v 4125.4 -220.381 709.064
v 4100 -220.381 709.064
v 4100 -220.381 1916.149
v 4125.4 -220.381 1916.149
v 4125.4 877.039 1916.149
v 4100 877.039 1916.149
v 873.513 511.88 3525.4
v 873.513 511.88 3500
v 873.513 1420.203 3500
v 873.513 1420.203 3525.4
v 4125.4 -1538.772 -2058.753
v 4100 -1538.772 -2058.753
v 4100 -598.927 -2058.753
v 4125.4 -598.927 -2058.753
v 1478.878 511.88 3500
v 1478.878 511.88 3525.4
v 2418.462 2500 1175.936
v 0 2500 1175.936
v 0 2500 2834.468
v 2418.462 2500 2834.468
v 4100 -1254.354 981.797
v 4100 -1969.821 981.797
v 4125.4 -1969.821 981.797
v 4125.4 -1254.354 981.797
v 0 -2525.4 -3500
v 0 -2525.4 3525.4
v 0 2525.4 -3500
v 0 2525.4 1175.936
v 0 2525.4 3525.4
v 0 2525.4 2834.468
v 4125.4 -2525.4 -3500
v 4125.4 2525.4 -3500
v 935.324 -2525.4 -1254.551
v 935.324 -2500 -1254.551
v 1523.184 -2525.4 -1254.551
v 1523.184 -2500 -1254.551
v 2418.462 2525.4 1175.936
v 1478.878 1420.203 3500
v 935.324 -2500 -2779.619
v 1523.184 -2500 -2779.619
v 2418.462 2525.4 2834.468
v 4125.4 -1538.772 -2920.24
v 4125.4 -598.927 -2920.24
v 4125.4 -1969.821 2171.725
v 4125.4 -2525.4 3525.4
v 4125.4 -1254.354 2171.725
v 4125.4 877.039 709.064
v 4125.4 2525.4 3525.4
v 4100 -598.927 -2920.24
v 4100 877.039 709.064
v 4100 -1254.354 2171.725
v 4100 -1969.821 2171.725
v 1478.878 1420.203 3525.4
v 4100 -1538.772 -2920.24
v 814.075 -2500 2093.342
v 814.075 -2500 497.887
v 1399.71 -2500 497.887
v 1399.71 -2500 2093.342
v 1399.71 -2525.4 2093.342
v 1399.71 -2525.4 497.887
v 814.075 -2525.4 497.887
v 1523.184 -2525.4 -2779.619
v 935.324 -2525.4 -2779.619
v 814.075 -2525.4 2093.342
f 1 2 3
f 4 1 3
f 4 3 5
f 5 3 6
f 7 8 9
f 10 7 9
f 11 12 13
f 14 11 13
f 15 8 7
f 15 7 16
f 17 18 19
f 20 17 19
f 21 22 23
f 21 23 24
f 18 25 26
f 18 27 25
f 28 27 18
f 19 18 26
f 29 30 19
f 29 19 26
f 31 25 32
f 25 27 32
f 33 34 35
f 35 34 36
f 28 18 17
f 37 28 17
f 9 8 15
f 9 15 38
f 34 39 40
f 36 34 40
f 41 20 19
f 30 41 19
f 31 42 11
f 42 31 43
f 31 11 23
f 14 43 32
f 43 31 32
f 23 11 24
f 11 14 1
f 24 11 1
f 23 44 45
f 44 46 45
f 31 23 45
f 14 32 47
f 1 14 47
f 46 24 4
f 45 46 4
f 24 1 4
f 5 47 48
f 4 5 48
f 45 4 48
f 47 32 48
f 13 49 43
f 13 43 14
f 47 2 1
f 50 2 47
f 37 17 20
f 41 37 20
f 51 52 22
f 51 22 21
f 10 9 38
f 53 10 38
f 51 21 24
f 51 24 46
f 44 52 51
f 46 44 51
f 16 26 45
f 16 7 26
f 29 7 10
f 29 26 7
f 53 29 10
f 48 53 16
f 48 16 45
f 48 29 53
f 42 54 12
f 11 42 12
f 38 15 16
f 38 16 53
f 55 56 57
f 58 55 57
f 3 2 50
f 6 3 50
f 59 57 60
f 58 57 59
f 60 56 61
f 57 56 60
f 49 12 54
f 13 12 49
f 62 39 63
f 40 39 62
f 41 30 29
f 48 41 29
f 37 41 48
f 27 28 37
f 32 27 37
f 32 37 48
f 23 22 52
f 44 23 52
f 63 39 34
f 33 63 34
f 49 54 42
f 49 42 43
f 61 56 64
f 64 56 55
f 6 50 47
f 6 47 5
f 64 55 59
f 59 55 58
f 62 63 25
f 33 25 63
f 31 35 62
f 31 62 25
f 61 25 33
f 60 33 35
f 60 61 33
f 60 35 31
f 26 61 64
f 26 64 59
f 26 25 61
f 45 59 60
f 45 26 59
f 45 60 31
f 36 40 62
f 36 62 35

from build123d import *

# Parameters (mm, degrees)
F0_W     = 5000
F0_H     = 7000
F1_DEPTH = 4100
F2_W     = 5000
F2_H     = 7000
F2_W_2   = 939.845443
F2_H_2   = 861.487865
F2_W_3   = 715.46793
F2_H_3   = 1189.927101
F2_W_4   = 1097.420633
F2_H_4   = 1207.084894
F3_DEPTH = 25.4
F5_DEPTH = 25.4
F6_W     = 4125.4
F6_H     = 5025.4
F6_W_2   = 605.365574
F6_H_2   = 908.323109
F7_DEPTH = 25.4
F8_W     = 4125.4
F8_H     = 7025.4
F8_W_2   = 587.859869
F8_H_2   = 1525.068283
F8_W_3   = 585.635364
F8_H_3   = 1595.454812
F9_DEPTH = 25.4


with BuildPart() as f1:
    # F0 (on Right) → F1 (new body)
    with BuildSketch(Plane.YZ):
        Rectangle(F0_W, F0_H)
    extrude(amount=F1_DEPTH)

    # F2 (on face) → F3 (join)
    with BuildSketch(Plane.YZ.offset(4100)):
        Rectangle(F2_W, F2_H)
        with Locations((-1068.849325, -2489.496469)):
            Rectangle(F2_W_2, F2_H_2, mode=Mode.SUBTRACT)
        with Locations((-1612.087488, 1576.761008)):
            Rectangle(F2_W_3, F2_H_3, mode=Mode.SUBTRACT)
        with Locations((328.328997, 1312.606573)):
            Rectangle(F2_W_4, F2_H_4, mode=Mode.SUBTRACT)
    extrude(amount=F3_DEPTH)

    # F4 (on face) → F5 (join)
    with BuildSketch(Plane(origin=(0, 2500, 0), x_dir=(-1, 0, 0), z_dir=(0, 1, 0))):
        Polygon((0, -3500), (0, 1175.935984), (-2418.462276, 1175.935984), (-2418.462276, 2834.468126), (0, 2834.468126), (0, 3500), (-4125.4, 3500), (-4125.4, -3500), align=None)
    extrude(amount=F5_DEPTH)

    # F6 (on face) → F7 (join)
    with BuildSketch(Plane.XY.offset(3500)):
        with Locations((2062.7, 12.7)):
            Rectangle(F6_W, F6_H)
        with Locations((1176.195592, 966.041773)):
            Rectangle(F6_W_2, F6_H_2, mode=Mode.SUBTRACT)
    extrude(amount=F7_DEPTH)

    # F8 (on face) → F9 (join)
    with BuildSketch(Plane.XZ.offset(2500)):
        with Locations((2062.7, 12.7)):
            Rectangle(F8_W, F8_H)
        with Locations((1229.253768, -2017.085313)):
            Rectangle(F8_W_2, F8_H_2, mode=Mode.SUBTRACT)
        with Locations((1106.892616, 1295.614898)):
            Rectangle(F8_W_3, F8_H_3, mode=Mode.SUBTRACT)
    extrude(amount=F9_DEPTH)


solid = f1.part
